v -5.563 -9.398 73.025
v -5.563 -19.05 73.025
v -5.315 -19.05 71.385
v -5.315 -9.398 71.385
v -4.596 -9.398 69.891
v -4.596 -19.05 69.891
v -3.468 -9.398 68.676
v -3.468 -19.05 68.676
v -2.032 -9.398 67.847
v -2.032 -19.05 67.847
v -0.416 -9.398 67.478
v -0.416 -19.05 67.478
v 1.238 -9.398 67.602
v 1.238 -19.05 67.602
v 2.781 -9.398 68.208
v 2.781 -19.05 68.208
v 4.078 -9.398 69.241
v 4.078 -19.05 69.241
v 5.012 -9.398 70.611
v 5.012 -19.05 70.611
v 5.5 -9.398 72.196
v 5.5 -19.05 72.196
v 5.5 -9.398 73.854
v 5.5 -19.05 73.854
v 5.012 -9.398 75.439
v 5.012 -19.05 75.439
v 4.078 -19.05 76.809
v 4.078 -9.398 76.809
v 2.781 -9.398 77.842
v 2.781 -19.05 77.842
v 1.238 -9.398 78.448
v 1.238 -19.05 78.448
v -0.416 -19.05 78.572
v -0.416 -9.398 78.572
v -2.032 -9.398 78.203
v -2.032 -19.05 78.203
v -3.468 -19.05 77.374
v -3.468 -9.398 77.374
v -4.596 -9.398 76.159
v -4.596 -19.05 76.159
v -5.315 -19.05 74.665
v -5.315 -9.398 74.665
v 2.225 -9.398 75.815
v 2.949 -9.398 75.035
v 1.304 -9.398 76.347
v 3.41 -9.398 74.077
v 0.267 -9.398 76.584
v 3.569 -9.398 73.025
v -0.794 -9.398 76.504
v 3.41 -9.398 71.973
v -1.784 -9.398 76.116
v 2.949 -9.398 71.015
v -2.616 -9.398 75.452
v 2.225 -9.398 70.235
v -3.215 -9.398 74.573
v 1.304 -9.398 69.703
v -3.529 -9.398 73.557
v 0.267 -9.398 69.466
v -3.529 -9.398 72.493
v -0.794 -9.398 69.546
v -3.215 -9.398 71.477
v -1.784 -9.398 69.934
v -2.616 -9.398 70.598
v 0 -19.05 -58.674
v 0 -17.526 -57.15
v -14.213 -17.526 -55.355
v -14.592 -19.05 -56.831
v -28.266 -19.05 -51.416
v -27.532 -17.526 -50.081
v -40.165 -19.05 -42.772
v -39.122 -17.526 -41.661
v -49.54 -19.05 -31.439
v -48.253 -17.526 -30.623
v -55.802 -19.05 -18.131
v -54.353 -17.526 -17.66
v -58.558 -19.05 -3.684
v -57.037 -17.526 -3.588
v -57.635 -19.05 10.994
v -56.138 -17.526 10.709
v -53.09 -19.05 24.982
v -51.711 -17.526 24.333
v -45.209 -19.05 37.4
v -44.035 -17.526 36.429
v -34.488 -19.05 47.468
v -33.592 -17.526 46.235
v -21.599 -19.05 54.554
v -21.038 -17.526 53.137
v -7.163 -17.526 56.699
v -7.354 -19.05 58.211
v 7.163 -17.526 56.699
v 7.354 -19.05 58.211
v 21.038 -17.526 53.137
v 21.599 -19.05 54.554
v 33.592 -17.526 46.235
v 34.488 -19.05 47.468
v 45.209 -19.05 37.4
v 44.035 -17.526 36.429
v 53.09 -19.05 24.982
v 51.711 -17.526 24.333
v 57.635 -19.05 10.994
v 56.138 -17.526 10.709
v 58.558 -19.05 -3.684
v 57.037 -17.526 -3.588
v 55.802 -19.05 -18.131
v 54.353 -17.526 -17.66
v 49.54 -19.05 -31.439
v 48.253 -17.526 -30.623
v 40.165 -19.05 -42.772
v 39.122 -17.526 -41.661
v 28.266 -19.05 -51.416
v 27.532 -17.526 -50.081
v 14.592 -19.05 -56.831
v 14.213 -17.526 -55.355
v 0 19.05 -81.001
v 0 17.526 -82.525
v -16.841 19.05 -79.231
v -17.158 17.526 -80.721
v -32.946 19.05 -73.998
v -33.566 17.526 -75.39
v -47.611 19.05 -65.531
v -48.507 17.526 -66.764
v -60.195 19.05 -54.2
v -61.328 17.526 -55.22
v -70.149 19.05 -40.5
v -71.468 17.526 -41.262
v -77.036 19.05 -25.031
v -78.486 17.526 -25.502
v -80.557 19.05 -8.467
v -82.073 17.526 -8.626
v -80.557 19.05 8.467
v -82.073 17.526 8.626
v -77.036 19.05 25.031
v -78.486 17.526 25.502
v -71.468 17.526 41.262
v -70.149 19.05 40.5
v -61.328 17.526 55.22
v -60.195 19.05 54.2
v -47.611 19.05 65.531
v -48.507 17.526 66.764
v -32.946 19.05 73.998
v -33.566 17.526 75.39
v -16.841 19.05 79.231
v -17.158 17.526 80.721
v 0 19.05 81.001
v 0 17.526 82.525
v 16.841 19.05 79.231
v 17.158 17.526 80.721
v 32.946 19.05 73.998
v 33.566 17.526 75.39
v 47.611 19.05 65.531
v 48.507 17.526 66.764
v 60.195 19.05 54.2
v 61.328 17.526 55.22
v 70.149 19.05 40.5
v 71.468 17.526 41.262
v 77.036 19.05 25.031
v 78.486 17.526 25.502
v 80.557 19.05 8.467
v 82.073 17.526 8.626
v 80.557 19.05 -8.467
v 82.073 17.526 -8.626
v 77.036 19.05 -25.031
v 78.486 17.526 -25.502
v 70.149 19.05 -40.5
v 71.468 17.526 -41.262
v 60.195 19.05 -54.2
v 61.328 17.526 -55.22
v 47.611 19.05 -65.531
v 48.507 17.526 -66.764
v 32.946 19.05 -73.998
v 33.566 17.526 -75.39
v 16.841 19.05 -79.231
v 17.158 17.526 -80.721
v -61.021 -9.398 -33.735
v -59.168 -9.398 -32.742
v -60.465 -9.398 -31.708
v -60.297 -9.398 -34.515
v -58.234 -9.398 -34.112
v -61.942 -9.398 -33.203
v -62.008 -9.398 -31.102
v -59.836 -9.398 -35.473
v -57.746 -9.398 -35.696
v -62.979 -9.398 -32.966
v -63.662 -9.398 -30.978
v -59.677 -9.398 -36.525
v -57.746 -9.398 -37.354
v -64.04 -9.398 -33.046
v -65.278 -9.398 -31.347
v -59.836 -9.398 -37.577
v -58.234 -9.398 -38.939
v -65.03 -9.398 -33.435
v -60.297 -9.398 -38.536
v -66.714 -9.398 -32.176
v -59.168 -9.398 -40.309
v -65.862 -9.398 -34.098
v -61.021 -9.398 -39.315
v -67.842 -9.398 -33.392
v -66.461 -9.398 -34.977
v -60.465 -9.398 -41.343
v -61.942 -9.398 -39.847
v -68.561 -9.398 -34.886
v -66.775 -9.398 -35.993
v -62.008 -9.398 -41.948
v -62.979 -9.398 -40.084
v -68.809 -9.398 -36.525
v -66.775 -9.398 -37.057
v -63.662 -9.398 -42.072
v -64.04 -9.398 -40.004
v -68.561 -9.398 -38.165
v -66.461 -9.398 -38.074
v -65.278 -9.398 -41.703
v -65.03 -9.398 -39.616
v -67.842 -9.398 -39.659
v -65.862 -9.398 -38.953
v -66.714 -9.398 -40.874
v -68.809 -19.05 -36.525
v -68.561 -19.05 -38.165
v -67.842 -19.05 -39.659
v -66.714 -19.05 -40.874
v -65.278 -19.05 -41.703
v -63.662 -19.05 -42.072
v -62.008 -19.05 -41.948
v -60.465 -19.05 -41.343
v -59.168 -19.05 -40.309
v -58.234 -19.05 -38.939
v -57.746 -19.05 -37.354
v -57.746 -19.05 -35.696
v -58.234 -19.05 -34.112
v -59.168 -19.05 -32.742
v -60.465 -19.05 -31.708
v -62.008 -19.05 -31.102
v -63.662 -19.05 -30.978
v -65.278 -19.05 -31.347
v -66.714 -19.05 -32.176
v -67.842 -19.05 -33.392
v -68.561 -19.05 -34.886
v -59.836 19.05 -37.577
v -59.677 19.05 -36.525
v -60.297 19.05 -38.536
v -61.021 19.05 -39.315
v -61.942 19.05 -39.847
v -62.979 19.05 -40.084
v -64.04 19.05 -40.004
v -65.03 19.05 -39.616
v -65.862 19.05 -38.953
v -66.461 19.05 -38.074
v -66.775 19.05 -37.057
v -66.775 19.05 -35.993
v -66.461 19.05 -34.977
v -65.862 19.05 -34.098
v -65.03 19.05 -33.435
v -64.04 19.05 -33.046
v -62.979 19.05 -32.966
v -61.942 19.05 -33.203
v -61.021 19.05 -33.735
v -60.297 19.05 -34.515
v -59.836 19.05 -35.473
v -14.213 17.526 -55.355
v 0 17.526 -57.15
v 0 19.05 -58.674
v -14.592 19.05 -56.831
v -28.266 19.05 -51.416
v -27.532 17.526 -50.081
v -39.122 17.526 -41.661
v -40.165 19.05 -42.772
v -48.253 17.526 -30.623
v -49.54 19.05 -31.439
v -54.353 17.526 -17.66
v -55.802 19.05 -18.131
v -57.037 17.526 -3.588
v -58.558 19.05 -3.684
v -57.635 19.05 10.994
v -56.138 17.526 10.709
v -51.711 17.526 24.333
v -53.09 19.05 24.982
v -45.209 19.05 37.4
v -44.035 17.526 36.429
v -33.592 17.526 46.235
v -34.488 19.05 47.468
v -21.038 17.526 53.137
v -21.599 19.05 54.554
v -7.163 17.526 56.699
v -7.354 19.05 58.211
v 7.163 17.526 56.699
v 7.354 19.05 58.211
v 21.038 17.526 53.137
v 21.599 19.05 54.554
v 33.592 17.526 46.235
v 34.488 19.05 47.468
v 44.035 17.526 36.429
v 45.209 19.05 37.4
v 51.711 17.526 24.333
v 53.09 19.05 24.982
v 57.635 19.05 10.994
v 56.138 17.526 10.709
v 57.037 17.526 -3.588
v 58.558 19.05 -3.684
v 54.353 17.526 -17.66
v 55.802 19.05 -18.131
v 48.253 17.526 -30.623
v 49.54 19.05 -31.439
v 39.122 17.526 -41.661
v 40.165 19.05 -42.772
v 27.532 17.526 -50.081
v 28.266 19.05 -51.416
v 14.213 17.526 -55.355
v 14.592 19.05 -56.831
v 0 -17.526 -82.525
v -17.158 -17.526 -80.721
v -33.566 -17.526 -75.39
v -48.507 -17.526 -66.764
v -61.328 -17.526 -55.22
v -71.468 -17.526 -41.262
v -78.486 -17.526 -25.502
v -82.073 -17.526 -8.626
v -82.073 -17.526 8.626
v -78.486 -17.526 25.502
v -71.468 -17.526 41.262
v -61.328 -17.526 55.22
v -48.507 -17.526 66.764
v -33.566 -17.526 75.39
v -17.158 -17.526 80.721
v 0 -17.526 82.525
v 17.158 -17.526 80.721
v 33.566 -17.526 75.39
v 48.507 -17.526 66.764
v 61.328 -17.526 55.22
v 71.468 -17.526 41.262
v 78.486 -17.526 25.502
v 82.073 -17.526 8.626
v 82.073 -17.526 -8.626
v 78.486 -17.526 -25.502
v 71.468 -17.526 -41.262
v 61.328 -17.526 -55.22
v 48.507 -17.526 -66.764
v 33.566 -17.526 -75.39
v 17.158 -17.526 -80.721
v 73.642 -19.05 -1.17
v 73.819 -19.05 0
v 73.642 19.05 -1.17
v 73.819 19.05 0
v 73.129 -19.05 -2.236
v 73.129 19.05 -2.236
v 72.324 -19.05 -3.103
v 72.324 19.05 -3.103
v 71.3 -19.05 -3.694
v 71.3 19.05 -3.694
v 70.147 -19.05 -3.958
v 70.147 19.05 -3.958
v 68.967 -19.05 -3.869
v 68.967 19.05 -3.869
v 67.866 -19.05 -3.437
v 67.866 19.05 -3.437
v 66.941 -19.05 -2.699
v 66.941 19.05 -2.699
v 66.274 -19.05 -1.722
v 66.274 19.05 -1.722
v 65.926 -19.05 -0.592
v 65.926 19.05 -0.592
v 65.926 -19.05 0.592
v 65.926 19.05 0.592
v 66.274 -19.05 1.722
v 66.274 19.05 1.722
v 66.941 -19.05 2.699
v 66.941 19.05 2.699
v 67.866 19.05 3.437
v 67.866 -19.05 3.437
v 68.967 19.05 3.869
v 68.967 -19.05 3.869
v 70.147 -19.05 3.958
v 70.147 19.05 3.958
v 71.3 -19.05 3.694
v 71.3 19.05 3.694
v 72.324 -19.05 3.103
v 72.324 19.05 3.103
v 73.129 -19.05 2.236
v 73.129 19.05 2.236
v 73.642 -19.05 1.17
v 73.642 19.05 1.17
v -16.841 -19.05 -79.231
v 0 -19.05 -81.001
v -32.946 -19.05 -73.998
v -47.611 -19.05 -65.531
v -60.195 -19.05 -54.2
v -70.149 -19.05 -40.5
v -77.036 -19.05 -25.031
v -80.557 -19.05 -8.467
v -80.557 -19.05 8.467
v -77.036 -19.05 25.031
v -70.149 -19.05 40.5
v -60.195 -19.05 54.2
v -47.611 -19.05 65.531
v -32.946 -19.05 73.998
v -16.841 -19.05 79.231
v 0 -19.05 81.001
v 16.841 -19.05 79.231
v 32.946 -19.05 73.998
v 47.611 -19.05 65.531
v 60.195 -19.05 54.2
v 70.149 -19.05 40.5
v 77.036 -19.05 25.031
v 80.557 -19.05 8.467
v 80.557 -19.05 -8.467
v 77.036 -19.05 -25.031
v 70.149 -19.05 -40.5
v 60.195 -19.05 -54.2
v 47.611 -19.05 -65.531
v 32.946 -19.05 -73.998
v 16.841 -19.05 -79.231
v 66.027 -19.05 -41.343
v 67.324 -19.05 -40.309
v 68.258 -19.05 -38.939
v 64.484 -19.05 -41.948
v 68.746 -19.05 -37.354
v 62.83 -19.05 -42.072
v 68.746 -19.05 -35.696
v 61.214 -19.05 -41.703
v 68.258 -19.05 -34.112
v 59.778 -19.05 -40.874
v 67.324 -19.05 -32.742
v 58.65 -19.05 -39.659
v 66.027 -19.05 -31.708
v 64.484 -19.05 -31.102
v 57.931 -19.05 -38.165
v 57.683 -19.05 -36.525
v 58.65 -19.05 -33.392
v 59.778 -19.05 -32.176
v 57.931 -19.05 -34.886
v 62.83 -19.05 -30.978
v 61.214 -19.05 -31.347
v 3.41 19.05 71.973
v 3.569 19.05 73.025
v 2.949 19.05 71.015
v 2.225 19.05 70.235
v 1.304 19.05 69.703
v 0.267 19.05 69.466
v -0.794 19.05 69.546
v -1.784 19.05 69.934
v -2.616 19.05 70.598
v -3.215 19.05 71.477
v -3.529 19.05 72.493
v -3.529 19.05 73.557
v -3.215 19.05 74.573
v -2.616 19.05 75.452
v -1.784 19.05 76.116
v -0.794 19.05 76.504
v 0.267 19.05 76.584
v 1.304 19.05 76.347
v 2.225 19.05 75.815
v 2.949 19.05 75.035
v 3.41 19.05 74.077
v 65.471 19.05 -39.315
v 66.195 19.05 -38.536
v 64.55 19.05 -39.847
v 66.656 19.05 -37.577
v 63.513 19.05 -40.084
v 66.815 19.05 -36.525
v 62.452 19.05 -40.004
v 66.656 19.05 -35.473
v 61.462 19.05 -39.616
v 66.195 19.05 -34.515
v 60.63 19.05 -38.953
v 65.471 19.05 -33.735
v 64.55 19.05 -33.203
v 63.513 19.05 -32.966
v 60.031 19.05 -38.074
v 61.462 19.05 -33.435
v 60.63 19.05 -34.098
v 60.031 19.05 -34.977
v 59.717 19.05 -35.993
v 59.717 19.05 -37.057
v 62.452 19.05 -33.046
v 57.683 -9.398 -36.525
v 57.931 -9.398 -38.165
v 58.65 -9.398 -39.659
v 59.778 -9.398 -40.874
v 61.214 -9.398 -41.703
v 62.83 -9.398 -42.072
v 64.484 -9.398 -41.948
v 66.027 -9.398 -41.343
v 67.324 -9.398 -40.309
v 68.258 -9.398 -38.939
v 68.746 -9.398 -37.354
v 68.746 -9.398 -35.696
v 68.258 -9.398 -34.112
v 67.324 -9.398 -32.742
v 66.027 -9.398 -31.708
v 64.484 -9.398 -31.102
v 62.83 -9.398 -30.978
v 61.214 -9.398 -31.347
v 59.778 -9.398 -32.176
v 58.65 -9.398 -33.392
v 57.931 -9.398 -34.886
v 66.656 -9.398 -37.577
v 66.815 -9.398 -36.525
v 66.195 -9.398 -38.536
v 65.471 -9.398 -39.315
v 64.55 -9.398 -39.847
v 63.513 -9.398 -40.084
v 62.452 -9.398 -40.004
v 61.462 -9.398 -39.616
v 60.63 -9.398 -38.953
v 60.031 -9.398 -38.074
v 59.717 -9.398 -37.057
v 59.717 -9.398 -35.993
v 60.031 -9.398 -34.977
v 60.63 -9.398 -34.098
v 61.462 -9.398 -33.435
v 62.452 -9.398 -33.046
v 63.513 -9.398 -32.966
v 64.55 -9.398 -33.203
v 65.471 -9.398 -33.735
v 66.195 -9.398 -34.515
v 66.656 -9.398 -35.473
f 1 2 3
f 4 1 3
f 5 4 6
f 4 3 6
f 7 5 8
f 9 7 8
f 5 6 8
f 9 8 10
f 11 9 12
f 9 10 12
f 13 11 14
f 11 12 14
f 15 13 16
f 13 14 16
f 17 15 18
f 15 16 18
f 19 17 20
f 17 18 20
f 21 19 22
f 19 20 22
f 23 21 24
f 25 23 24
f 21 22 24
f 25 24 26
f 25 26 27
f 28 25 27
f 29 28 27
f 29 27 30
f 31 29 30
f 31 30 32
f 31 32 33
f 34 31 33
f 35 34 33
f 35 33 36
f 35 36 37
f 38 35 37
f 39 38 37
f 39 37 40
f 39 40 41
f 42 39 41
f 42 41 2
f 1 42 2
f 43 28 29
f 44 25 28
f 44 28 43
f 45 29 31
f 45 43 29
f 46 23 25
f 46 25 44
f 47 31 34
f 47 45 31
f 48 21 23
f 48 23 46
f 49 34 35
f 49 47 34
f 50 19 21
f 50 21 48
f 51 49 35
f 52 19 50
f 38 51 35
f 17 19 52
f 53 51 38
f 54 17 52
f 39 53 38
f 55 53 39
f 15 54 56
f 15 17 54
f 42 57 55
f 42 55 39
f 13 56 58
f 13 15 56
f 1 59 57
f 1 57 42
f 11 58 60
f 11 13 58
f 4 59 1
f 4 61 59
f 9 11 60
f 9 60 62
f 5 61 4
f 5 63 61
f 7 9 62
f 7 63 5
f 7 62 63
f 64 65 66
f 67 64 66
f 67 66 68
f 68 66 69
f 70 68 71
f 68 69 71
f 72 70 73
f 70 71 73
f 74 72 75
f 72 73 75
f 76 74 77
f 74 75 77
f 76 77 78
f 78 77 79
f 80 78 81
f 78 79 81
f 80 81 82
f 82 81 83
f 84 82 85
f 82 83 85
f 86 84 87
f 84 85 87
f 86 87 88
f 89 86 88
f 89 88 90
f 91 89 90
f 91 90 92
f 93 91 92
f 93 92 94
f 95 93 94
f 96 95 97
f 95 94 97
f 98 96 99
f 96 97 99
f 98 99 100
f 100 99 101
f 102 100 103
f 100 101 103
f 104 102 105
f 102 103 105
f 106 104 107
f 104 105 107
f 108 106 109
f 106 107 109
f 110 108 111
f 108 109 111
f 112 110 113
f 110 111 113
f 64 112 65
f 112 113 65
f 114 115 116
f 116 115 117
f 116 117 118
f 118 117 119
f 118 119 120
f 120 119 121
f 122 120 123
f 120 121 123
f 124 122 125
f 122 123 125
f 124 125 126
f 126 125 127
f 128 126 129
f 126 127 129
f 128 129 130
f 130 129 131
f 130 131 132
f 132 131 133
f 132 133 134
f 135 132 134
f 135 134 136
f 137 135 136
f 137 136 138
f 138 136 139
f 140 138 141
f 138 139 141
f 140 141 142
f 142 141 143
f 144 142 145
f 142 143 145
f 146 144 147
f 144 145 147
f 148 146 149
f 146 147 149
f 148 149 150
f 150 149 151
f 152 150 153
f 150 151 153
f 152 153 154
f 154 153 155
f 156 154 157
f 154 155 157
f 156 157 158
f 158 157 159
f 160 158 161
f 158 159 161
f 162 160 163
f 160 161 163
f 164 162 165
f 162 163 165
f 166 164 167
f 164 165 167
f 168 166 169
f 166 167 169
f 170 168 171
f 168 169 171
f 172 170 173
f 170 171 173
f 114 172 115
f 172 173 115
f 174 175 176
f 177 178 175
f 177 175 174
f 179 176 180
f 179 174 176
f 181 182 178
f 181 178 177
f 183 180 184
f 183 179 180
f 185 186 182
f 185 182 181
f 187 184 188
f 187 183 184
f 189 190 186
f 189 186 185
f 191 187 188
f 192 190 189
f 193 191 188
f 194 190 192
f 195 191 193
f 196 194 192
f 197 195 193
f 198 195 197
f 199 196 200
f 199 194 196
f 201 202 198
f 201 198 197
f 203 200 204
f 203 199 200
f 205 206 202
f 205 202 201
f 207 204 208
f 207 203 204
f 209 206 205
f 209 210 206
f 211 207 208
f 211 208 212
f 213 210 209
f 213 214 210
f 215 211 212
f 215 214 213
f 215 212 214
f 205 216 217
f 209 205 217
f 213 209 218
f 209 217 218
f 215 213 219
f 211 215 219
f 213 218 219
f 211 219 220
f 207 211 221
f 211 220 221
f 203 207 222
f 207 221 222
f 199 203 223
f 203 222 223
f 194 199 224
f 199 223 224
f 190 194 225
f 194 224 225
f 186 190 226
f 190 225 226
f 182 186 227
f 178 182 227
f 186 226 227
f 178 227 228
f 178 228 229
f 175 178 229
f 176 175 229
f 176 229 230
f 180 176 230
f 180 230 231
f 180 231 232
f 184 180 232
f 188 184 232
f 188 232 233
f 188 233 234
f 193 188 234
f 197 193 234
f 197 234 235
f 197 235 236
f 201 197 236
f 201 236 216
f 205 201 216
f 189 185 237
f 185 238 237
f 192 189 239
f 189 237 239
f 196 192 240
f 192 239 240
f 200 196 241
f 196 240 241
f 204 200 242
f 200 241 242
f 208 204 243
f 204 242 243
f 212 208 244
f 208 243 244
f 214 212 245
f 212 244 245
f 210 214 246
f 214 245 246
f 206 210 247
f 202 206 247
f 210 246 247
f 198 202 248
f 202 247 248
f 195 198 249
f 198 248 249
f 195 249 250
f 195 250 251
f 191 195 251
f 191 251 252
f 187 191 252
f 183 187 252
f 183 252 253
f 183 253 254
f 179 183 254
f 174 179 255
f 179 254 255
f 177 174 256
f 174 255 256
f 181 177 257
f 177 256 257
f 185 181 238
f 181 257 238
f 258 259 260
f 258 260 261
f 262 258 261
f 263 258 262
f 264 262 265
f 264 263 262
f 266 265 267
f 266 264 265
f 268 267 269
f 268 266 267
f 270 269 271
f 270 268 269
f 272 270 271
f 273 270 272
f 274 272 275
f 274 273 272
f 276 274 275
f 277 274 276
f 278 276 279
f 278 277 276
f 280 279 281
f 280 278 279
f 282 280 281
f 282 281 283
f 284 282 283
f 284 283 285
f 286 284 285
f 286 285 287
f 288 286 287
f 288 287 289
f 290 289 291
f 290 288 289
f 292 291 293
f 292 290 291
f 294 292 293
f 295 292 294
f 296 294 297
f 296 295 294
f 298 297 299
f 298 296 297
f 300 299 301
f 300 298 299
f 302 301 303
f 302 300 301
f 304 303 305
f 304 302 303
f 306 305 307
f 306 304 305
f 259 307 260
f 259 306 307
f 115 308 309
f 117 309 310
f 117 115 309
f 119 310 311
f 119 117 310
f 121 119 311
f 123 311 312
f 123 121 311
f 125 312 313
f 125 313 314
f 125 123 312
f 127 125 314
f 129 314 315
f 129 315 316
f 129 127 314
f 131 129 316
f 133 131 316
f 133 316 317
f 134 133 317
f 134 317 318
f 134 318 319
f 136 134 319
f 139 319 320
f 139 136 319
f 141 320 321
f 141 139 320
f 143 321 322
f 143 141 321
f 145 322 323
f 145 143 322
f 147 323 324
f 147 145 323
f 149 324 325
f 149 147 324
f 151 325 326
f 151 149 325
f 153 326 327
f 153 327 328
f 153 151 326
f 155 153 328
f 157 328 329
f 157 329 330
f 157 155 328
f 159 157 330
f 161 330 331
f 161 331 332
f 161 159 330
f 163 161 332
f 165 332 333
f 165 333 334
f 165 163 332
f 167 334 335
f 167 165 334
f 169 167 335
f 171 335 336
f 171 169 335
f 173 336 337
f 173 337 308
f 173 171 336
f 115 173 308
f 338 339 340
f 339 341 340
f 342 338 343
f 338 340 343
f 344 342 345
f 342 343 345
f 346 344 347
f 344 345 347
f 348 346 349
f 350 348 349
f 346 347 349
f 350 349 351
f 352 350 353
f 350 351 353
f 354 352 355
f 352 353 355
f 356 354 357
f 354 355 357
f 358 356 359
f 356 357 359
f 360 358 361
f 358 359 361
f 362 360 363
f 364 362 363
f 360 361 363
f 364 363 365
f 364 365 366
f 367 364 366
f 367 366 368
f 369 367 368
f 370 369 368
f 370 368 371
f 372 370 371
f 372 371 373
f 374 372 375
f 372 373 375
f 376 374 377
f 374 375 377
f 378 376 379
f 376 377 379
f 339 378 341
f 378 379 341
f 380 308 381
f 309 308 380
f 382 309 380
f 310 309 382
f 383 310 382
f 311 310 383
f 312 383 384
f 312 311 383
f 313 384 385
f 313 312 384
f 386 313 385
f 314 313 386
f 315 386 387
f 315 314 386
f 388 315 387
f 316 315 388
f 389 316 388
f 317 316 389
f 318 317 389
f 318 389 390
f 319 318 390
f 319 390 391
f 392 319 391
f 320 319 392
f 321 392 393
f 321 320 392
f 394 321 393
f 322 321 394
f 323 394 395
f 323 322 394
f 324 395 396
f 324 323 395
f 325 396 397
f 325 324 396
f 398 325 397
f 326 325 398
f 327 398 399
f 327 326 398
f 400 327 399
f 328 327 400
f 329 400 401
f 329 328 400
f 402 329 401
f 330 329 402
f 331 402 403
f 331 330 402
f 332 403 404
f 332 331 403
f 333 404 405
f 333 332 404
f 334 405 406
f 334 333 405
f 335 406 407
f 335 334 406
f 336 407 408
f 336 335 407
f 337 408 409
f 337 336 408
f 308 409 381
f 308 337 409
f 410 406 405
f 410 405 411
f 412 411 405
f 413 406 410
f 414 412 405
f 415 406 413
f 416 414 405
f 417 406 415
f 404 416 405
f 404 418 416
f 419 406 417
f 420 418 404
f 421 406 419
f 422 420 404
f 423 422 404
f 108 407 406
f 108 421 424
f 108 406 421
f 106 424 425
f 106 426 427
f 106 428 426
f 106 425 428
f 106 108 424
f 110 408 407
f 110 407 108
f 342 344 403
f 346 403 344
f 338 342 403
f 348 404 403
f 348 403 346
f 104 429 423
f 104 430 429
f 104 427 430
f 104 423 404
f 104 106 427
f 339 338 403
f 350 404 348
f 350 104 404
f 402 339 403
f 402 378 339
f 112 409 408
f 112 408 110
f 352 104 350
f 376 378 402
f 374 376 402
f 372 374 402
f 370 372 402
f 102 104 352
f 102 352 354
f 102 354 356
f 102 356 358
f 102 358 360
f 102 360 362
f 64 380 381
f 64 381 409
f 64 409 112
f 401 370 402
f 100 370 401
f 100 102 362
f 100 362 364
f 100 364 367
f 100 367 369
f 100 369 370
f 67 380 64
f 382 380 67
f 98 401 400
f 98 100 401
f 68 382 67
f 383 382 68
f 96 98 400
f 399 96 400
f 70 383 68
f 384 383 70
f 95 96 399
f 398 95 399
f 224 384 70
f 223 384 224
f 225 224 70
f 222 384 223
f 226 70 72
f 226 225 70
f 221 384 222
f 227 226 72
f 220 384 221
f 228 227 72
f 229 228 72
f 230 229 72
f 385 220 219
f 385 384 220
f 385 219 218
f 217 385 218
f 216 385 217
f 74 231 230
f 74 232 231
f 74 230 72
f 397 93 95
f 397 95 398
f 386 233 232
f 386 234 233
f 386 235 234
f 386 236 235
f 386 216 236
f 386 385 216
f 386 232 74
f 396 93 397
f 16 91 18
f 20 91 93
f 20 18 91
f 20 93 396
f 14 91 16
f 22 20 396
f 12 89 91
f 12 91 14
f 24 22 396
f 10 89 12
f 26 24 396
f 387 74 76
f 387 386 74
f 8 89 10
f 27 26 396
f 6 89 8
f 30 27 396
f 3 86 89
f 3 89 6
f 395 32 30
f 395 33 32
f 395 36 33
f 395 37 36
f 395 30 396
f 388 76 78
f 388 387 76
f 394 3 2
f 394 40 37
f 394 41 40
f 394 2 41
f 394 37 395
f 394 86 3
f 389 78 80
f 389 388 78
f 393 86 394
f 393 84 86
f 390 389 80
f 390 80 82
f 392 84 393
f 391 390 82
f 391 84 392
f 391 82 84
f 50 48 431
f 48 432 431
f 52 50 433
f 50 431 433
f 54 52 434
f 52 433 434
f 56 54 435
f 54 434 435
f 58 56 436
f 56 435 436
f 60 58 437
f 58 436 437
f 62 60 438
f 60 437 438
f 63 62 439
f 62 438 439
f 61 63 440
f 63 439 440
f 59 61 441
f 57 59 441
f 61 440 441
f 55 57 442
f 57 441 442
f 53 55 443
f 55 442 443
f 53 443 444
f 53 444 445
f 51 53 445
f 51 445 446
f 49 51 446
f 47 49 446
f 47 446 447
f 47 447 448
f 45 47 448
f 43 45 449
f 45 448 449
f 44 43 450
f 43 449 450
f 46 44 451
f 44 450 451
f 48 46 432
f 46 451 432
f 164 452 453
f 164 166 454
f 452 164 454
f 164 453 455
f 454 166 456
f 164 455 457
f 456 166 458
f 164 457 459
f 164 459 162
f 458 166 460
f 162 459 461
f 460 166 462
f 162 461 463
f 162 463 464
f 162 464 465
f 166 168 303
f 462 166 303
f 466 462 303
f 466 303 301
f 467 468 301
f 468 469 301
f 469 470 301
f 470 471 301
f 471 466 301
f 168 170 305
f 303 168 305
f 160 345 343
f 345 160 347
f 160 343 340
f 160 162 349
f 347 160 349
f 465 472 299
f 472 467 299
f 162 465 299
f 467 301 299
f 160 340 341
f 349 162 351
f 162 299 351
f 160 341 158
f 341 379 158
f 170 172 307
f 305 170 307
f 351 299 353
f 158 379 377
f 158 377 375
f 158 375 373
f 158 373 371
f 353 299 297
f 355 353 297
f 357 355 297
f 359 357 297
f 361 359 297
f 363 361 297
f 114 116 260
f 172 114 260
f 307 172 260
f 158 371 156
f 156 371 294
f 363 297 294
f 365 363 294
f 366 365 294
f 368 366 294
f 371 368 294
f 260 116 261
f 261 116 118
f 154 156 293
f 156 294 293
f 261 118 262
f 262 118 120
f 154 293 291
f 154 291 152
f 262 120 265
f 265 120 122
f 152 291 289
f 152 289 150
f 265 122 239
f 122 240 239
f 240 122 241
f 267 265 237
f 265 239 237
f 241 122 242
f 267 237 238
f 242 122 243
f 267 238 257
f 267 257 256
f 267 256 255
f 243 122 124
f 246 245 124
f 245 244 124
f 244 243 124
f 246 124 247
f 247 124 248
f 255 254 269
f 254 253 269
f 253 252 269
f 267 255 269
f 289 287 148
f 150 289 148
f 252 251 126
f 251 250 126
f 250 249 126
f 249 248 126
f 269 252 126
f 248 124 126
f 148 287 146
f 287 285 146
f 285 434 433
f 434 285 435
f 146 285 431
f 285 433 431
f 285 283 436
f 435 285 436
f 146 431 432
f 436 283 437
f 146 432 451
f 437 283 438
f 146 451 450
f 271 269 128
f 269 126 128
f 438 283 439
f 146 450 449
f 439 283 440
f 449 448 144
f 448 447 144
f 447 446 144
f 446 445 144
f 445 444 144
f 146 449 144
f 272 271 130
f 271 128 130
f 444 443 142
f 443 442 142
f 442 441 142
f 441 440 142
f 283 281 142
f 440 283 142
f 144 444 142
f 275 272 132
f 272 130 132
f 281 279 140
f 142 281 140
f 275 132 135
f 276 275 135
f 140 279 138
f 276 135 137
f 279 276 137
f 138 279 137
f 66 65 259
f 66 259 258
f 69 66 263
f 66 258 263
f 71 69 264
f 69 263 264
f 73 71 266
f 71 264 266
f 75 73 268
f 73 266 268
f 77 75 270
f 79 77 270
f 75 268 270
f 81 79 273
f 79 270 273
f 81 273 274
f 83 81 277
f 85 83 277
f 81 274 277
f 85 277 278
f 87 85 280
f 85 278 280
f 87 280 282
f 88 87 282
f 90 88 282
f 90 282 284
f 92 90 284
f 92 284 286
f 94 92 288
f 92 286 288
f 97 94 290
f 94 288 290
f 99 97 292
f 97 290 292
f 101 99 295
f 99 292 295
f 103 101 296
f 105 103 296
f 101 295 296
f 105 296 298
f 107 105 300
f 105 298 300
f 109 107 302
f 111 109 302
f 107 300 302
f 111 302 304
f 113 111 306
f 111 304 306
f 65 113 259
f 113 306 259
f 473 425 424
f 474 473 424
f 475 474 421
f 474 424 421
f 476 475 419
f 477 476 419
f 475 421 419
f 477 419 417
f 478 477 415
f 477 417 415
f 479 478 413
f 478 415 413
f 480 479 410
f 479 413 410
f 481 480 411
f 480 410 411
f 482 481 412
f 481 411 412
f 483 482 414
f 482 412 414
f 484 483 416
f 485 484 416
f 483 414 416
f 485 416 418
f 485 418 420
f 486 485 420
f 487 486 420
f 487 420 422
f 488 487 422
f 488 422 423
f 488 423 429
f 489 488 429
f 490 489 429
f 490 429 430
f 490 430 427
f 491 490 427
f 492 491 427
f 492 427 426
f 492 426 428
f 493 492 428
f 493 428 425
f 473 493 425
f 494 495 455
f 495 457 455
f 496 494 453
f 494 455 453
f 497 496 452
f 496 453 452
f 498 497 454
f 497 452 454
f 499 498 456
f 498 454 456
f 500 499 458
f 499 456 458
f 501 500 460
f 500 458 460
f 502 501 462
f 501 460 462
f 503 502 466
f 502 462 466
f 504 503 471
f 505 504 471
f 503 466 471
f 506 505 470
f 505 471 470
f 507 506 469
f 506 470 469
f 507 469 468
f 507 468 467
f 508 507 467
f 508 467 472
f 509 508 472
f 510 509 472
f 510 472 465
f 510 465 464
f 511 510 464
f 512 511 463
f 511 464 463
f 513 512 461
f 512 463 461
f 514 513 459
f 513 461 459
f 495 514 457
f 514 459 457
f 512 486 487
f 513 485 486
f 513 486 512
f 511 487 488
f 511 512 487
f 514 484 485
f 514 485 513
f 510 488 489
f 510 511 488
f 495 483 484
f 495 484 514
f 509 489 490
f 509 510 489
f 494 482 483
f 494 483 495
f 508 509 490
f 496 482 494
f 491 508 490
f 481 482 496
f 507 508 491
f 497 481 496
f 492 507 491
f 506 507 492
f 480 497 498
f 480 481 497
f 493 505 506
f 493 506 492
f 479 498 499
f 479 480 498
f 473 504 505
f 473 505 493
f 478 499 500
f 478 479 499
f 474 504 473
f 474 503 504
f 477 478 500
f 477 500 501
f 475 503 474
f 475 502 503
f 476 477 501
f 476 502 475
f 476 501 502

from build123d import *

# Parameters (mm, degrees)
SKETCH1_W                                        = 38.1
SKETCH1_H                                        = 25.3746
CBORE_FOR_1_4_SOCKET_HEAD_CAP_SCREW1_D           = 7.1374
CBORE_FOR_1_4_SOCKET_HEAD_CAP_SCREW1_DEPTH       = 38.1
CBORE_FOR_1_4_SOCKET_HEAD_CAP_SCREW1_CBORE_D     = 11.1252
CBORE_FOR_1_4_SOCKET_HEAD_CAP_SCREW1_CBORE_DEPTH = 9.652
CBORE_FOR_1_4_SOCKET_HEAD_CAP_SCREW1_TIP         = 2.144291291
F_3_8_16_TAPPED_HOLE1_D                          = 7.9375
F_3_8_16_TAPPED_HOLE1_DEPTH                      = 38.1
F_3_8_16_TAPPED_HOLE1_TIP                        = 2.384665582
CHAMFER1_SIZE                                    = 1.524


with BuildPart() as part:
    # Sketch1 → Revolve1 (revolve)
    with BuildSketch(Plane(origin=(0, 0, 0), x_dir=(0, 1, 0), z_dir=(0, 0, 1)), mode=Mode.PRIVATE) as revolve1_sk:
        with Locations((0, 69.8373)):
            Rectangle(SKETCH1_W, SKETCH1_H)
    revolve(revolve1_sk.sketch.rotate(Axis((0, -44.45, 0), (0, 1, 0)), 270), axis=Axis((0, -44.45, 0), (0, 1, 0)))

    # CBORE for 1/4 Socket Head Cap Screw1
    with Locations(Plane(origin=(0, -19.05, 0), x_dir=(-1, 0, 0), z_dir=(0, -1, 0))):
        with Locations((0, -73.025), (-63.246, 36.5252), (63.246, 36.5252)):
            CounterBoreHole(CBORE_FOR_1_4_SOCKET_HEAD_CAP_SCREW1_D / 2, CBORE_FOR_1_4_SOCKET_HEAD_CAP_SCREW1_CBORE_D / 2, CBORE_FOR_1_4_SOCKET_HEAD_CAP_SCREW1_CBORE_DEPTH, depth=CBORE_FOR_1_4_SOCKET_HEAD_CAP_SCREW1_DEPTH)
            with Locations((0, 0, -(CBORE_FOR_1_4_SOCKET_HEAD_CAP_SCREW1_DEPTH + CBORE_FOR_1_4_SOCKET_HEAD_CAP_SCREW1_TIP / 2))):  # 118° drill point
                Cone(0, CBORE_FOR_1_4_SOCKET_HEAD_CAP_SCREW1_D / 2, CBORE_FOR_1_4_SOCKET_HEAD_CAP_SCREW1_TIP, mode=Mode.SUBTRACT)

    # 3/8-16 Tapped Hole1
    with Locations(Plane(origin=(0, -19.05, 0), x_dir=(-1, 0, 0), z_dir=(0, -1, 0))):
        with Locations((-69.85, 0)):
            Hole(F_3_8_16_TAPPED_HOLE1_D / 2, depth=F_3_8_16_TAPPED_HOLE1_DEPTH)
            with Locations((0, 0, -(F_3_8_16_TAPPED_HOLE1_DEPTH + F_3_8_16_TAPPED_HOLE1_TIP / 2))):  # 118° drill point
                Cone(0, F_3_8_16_TAPPED_HOLE1_D / 2, F_3_8_16_TAPPED_HOLE1_TIP, mode=Mode.SUBTRACT)

    # Chamfer1
    chamfer1_edges = [part.edges().sort_by_distance(p)[0] for p in [
        (0, -19.05, 57.15),
        (0, 19.05, 57.15),
        (0, 19.05, 82.5246),
        (0, -19.05, 82.5246),
    ]]
    chamfer(chamfer1_edges, length=CHAMFER1_SIZE)


solid = part.part
